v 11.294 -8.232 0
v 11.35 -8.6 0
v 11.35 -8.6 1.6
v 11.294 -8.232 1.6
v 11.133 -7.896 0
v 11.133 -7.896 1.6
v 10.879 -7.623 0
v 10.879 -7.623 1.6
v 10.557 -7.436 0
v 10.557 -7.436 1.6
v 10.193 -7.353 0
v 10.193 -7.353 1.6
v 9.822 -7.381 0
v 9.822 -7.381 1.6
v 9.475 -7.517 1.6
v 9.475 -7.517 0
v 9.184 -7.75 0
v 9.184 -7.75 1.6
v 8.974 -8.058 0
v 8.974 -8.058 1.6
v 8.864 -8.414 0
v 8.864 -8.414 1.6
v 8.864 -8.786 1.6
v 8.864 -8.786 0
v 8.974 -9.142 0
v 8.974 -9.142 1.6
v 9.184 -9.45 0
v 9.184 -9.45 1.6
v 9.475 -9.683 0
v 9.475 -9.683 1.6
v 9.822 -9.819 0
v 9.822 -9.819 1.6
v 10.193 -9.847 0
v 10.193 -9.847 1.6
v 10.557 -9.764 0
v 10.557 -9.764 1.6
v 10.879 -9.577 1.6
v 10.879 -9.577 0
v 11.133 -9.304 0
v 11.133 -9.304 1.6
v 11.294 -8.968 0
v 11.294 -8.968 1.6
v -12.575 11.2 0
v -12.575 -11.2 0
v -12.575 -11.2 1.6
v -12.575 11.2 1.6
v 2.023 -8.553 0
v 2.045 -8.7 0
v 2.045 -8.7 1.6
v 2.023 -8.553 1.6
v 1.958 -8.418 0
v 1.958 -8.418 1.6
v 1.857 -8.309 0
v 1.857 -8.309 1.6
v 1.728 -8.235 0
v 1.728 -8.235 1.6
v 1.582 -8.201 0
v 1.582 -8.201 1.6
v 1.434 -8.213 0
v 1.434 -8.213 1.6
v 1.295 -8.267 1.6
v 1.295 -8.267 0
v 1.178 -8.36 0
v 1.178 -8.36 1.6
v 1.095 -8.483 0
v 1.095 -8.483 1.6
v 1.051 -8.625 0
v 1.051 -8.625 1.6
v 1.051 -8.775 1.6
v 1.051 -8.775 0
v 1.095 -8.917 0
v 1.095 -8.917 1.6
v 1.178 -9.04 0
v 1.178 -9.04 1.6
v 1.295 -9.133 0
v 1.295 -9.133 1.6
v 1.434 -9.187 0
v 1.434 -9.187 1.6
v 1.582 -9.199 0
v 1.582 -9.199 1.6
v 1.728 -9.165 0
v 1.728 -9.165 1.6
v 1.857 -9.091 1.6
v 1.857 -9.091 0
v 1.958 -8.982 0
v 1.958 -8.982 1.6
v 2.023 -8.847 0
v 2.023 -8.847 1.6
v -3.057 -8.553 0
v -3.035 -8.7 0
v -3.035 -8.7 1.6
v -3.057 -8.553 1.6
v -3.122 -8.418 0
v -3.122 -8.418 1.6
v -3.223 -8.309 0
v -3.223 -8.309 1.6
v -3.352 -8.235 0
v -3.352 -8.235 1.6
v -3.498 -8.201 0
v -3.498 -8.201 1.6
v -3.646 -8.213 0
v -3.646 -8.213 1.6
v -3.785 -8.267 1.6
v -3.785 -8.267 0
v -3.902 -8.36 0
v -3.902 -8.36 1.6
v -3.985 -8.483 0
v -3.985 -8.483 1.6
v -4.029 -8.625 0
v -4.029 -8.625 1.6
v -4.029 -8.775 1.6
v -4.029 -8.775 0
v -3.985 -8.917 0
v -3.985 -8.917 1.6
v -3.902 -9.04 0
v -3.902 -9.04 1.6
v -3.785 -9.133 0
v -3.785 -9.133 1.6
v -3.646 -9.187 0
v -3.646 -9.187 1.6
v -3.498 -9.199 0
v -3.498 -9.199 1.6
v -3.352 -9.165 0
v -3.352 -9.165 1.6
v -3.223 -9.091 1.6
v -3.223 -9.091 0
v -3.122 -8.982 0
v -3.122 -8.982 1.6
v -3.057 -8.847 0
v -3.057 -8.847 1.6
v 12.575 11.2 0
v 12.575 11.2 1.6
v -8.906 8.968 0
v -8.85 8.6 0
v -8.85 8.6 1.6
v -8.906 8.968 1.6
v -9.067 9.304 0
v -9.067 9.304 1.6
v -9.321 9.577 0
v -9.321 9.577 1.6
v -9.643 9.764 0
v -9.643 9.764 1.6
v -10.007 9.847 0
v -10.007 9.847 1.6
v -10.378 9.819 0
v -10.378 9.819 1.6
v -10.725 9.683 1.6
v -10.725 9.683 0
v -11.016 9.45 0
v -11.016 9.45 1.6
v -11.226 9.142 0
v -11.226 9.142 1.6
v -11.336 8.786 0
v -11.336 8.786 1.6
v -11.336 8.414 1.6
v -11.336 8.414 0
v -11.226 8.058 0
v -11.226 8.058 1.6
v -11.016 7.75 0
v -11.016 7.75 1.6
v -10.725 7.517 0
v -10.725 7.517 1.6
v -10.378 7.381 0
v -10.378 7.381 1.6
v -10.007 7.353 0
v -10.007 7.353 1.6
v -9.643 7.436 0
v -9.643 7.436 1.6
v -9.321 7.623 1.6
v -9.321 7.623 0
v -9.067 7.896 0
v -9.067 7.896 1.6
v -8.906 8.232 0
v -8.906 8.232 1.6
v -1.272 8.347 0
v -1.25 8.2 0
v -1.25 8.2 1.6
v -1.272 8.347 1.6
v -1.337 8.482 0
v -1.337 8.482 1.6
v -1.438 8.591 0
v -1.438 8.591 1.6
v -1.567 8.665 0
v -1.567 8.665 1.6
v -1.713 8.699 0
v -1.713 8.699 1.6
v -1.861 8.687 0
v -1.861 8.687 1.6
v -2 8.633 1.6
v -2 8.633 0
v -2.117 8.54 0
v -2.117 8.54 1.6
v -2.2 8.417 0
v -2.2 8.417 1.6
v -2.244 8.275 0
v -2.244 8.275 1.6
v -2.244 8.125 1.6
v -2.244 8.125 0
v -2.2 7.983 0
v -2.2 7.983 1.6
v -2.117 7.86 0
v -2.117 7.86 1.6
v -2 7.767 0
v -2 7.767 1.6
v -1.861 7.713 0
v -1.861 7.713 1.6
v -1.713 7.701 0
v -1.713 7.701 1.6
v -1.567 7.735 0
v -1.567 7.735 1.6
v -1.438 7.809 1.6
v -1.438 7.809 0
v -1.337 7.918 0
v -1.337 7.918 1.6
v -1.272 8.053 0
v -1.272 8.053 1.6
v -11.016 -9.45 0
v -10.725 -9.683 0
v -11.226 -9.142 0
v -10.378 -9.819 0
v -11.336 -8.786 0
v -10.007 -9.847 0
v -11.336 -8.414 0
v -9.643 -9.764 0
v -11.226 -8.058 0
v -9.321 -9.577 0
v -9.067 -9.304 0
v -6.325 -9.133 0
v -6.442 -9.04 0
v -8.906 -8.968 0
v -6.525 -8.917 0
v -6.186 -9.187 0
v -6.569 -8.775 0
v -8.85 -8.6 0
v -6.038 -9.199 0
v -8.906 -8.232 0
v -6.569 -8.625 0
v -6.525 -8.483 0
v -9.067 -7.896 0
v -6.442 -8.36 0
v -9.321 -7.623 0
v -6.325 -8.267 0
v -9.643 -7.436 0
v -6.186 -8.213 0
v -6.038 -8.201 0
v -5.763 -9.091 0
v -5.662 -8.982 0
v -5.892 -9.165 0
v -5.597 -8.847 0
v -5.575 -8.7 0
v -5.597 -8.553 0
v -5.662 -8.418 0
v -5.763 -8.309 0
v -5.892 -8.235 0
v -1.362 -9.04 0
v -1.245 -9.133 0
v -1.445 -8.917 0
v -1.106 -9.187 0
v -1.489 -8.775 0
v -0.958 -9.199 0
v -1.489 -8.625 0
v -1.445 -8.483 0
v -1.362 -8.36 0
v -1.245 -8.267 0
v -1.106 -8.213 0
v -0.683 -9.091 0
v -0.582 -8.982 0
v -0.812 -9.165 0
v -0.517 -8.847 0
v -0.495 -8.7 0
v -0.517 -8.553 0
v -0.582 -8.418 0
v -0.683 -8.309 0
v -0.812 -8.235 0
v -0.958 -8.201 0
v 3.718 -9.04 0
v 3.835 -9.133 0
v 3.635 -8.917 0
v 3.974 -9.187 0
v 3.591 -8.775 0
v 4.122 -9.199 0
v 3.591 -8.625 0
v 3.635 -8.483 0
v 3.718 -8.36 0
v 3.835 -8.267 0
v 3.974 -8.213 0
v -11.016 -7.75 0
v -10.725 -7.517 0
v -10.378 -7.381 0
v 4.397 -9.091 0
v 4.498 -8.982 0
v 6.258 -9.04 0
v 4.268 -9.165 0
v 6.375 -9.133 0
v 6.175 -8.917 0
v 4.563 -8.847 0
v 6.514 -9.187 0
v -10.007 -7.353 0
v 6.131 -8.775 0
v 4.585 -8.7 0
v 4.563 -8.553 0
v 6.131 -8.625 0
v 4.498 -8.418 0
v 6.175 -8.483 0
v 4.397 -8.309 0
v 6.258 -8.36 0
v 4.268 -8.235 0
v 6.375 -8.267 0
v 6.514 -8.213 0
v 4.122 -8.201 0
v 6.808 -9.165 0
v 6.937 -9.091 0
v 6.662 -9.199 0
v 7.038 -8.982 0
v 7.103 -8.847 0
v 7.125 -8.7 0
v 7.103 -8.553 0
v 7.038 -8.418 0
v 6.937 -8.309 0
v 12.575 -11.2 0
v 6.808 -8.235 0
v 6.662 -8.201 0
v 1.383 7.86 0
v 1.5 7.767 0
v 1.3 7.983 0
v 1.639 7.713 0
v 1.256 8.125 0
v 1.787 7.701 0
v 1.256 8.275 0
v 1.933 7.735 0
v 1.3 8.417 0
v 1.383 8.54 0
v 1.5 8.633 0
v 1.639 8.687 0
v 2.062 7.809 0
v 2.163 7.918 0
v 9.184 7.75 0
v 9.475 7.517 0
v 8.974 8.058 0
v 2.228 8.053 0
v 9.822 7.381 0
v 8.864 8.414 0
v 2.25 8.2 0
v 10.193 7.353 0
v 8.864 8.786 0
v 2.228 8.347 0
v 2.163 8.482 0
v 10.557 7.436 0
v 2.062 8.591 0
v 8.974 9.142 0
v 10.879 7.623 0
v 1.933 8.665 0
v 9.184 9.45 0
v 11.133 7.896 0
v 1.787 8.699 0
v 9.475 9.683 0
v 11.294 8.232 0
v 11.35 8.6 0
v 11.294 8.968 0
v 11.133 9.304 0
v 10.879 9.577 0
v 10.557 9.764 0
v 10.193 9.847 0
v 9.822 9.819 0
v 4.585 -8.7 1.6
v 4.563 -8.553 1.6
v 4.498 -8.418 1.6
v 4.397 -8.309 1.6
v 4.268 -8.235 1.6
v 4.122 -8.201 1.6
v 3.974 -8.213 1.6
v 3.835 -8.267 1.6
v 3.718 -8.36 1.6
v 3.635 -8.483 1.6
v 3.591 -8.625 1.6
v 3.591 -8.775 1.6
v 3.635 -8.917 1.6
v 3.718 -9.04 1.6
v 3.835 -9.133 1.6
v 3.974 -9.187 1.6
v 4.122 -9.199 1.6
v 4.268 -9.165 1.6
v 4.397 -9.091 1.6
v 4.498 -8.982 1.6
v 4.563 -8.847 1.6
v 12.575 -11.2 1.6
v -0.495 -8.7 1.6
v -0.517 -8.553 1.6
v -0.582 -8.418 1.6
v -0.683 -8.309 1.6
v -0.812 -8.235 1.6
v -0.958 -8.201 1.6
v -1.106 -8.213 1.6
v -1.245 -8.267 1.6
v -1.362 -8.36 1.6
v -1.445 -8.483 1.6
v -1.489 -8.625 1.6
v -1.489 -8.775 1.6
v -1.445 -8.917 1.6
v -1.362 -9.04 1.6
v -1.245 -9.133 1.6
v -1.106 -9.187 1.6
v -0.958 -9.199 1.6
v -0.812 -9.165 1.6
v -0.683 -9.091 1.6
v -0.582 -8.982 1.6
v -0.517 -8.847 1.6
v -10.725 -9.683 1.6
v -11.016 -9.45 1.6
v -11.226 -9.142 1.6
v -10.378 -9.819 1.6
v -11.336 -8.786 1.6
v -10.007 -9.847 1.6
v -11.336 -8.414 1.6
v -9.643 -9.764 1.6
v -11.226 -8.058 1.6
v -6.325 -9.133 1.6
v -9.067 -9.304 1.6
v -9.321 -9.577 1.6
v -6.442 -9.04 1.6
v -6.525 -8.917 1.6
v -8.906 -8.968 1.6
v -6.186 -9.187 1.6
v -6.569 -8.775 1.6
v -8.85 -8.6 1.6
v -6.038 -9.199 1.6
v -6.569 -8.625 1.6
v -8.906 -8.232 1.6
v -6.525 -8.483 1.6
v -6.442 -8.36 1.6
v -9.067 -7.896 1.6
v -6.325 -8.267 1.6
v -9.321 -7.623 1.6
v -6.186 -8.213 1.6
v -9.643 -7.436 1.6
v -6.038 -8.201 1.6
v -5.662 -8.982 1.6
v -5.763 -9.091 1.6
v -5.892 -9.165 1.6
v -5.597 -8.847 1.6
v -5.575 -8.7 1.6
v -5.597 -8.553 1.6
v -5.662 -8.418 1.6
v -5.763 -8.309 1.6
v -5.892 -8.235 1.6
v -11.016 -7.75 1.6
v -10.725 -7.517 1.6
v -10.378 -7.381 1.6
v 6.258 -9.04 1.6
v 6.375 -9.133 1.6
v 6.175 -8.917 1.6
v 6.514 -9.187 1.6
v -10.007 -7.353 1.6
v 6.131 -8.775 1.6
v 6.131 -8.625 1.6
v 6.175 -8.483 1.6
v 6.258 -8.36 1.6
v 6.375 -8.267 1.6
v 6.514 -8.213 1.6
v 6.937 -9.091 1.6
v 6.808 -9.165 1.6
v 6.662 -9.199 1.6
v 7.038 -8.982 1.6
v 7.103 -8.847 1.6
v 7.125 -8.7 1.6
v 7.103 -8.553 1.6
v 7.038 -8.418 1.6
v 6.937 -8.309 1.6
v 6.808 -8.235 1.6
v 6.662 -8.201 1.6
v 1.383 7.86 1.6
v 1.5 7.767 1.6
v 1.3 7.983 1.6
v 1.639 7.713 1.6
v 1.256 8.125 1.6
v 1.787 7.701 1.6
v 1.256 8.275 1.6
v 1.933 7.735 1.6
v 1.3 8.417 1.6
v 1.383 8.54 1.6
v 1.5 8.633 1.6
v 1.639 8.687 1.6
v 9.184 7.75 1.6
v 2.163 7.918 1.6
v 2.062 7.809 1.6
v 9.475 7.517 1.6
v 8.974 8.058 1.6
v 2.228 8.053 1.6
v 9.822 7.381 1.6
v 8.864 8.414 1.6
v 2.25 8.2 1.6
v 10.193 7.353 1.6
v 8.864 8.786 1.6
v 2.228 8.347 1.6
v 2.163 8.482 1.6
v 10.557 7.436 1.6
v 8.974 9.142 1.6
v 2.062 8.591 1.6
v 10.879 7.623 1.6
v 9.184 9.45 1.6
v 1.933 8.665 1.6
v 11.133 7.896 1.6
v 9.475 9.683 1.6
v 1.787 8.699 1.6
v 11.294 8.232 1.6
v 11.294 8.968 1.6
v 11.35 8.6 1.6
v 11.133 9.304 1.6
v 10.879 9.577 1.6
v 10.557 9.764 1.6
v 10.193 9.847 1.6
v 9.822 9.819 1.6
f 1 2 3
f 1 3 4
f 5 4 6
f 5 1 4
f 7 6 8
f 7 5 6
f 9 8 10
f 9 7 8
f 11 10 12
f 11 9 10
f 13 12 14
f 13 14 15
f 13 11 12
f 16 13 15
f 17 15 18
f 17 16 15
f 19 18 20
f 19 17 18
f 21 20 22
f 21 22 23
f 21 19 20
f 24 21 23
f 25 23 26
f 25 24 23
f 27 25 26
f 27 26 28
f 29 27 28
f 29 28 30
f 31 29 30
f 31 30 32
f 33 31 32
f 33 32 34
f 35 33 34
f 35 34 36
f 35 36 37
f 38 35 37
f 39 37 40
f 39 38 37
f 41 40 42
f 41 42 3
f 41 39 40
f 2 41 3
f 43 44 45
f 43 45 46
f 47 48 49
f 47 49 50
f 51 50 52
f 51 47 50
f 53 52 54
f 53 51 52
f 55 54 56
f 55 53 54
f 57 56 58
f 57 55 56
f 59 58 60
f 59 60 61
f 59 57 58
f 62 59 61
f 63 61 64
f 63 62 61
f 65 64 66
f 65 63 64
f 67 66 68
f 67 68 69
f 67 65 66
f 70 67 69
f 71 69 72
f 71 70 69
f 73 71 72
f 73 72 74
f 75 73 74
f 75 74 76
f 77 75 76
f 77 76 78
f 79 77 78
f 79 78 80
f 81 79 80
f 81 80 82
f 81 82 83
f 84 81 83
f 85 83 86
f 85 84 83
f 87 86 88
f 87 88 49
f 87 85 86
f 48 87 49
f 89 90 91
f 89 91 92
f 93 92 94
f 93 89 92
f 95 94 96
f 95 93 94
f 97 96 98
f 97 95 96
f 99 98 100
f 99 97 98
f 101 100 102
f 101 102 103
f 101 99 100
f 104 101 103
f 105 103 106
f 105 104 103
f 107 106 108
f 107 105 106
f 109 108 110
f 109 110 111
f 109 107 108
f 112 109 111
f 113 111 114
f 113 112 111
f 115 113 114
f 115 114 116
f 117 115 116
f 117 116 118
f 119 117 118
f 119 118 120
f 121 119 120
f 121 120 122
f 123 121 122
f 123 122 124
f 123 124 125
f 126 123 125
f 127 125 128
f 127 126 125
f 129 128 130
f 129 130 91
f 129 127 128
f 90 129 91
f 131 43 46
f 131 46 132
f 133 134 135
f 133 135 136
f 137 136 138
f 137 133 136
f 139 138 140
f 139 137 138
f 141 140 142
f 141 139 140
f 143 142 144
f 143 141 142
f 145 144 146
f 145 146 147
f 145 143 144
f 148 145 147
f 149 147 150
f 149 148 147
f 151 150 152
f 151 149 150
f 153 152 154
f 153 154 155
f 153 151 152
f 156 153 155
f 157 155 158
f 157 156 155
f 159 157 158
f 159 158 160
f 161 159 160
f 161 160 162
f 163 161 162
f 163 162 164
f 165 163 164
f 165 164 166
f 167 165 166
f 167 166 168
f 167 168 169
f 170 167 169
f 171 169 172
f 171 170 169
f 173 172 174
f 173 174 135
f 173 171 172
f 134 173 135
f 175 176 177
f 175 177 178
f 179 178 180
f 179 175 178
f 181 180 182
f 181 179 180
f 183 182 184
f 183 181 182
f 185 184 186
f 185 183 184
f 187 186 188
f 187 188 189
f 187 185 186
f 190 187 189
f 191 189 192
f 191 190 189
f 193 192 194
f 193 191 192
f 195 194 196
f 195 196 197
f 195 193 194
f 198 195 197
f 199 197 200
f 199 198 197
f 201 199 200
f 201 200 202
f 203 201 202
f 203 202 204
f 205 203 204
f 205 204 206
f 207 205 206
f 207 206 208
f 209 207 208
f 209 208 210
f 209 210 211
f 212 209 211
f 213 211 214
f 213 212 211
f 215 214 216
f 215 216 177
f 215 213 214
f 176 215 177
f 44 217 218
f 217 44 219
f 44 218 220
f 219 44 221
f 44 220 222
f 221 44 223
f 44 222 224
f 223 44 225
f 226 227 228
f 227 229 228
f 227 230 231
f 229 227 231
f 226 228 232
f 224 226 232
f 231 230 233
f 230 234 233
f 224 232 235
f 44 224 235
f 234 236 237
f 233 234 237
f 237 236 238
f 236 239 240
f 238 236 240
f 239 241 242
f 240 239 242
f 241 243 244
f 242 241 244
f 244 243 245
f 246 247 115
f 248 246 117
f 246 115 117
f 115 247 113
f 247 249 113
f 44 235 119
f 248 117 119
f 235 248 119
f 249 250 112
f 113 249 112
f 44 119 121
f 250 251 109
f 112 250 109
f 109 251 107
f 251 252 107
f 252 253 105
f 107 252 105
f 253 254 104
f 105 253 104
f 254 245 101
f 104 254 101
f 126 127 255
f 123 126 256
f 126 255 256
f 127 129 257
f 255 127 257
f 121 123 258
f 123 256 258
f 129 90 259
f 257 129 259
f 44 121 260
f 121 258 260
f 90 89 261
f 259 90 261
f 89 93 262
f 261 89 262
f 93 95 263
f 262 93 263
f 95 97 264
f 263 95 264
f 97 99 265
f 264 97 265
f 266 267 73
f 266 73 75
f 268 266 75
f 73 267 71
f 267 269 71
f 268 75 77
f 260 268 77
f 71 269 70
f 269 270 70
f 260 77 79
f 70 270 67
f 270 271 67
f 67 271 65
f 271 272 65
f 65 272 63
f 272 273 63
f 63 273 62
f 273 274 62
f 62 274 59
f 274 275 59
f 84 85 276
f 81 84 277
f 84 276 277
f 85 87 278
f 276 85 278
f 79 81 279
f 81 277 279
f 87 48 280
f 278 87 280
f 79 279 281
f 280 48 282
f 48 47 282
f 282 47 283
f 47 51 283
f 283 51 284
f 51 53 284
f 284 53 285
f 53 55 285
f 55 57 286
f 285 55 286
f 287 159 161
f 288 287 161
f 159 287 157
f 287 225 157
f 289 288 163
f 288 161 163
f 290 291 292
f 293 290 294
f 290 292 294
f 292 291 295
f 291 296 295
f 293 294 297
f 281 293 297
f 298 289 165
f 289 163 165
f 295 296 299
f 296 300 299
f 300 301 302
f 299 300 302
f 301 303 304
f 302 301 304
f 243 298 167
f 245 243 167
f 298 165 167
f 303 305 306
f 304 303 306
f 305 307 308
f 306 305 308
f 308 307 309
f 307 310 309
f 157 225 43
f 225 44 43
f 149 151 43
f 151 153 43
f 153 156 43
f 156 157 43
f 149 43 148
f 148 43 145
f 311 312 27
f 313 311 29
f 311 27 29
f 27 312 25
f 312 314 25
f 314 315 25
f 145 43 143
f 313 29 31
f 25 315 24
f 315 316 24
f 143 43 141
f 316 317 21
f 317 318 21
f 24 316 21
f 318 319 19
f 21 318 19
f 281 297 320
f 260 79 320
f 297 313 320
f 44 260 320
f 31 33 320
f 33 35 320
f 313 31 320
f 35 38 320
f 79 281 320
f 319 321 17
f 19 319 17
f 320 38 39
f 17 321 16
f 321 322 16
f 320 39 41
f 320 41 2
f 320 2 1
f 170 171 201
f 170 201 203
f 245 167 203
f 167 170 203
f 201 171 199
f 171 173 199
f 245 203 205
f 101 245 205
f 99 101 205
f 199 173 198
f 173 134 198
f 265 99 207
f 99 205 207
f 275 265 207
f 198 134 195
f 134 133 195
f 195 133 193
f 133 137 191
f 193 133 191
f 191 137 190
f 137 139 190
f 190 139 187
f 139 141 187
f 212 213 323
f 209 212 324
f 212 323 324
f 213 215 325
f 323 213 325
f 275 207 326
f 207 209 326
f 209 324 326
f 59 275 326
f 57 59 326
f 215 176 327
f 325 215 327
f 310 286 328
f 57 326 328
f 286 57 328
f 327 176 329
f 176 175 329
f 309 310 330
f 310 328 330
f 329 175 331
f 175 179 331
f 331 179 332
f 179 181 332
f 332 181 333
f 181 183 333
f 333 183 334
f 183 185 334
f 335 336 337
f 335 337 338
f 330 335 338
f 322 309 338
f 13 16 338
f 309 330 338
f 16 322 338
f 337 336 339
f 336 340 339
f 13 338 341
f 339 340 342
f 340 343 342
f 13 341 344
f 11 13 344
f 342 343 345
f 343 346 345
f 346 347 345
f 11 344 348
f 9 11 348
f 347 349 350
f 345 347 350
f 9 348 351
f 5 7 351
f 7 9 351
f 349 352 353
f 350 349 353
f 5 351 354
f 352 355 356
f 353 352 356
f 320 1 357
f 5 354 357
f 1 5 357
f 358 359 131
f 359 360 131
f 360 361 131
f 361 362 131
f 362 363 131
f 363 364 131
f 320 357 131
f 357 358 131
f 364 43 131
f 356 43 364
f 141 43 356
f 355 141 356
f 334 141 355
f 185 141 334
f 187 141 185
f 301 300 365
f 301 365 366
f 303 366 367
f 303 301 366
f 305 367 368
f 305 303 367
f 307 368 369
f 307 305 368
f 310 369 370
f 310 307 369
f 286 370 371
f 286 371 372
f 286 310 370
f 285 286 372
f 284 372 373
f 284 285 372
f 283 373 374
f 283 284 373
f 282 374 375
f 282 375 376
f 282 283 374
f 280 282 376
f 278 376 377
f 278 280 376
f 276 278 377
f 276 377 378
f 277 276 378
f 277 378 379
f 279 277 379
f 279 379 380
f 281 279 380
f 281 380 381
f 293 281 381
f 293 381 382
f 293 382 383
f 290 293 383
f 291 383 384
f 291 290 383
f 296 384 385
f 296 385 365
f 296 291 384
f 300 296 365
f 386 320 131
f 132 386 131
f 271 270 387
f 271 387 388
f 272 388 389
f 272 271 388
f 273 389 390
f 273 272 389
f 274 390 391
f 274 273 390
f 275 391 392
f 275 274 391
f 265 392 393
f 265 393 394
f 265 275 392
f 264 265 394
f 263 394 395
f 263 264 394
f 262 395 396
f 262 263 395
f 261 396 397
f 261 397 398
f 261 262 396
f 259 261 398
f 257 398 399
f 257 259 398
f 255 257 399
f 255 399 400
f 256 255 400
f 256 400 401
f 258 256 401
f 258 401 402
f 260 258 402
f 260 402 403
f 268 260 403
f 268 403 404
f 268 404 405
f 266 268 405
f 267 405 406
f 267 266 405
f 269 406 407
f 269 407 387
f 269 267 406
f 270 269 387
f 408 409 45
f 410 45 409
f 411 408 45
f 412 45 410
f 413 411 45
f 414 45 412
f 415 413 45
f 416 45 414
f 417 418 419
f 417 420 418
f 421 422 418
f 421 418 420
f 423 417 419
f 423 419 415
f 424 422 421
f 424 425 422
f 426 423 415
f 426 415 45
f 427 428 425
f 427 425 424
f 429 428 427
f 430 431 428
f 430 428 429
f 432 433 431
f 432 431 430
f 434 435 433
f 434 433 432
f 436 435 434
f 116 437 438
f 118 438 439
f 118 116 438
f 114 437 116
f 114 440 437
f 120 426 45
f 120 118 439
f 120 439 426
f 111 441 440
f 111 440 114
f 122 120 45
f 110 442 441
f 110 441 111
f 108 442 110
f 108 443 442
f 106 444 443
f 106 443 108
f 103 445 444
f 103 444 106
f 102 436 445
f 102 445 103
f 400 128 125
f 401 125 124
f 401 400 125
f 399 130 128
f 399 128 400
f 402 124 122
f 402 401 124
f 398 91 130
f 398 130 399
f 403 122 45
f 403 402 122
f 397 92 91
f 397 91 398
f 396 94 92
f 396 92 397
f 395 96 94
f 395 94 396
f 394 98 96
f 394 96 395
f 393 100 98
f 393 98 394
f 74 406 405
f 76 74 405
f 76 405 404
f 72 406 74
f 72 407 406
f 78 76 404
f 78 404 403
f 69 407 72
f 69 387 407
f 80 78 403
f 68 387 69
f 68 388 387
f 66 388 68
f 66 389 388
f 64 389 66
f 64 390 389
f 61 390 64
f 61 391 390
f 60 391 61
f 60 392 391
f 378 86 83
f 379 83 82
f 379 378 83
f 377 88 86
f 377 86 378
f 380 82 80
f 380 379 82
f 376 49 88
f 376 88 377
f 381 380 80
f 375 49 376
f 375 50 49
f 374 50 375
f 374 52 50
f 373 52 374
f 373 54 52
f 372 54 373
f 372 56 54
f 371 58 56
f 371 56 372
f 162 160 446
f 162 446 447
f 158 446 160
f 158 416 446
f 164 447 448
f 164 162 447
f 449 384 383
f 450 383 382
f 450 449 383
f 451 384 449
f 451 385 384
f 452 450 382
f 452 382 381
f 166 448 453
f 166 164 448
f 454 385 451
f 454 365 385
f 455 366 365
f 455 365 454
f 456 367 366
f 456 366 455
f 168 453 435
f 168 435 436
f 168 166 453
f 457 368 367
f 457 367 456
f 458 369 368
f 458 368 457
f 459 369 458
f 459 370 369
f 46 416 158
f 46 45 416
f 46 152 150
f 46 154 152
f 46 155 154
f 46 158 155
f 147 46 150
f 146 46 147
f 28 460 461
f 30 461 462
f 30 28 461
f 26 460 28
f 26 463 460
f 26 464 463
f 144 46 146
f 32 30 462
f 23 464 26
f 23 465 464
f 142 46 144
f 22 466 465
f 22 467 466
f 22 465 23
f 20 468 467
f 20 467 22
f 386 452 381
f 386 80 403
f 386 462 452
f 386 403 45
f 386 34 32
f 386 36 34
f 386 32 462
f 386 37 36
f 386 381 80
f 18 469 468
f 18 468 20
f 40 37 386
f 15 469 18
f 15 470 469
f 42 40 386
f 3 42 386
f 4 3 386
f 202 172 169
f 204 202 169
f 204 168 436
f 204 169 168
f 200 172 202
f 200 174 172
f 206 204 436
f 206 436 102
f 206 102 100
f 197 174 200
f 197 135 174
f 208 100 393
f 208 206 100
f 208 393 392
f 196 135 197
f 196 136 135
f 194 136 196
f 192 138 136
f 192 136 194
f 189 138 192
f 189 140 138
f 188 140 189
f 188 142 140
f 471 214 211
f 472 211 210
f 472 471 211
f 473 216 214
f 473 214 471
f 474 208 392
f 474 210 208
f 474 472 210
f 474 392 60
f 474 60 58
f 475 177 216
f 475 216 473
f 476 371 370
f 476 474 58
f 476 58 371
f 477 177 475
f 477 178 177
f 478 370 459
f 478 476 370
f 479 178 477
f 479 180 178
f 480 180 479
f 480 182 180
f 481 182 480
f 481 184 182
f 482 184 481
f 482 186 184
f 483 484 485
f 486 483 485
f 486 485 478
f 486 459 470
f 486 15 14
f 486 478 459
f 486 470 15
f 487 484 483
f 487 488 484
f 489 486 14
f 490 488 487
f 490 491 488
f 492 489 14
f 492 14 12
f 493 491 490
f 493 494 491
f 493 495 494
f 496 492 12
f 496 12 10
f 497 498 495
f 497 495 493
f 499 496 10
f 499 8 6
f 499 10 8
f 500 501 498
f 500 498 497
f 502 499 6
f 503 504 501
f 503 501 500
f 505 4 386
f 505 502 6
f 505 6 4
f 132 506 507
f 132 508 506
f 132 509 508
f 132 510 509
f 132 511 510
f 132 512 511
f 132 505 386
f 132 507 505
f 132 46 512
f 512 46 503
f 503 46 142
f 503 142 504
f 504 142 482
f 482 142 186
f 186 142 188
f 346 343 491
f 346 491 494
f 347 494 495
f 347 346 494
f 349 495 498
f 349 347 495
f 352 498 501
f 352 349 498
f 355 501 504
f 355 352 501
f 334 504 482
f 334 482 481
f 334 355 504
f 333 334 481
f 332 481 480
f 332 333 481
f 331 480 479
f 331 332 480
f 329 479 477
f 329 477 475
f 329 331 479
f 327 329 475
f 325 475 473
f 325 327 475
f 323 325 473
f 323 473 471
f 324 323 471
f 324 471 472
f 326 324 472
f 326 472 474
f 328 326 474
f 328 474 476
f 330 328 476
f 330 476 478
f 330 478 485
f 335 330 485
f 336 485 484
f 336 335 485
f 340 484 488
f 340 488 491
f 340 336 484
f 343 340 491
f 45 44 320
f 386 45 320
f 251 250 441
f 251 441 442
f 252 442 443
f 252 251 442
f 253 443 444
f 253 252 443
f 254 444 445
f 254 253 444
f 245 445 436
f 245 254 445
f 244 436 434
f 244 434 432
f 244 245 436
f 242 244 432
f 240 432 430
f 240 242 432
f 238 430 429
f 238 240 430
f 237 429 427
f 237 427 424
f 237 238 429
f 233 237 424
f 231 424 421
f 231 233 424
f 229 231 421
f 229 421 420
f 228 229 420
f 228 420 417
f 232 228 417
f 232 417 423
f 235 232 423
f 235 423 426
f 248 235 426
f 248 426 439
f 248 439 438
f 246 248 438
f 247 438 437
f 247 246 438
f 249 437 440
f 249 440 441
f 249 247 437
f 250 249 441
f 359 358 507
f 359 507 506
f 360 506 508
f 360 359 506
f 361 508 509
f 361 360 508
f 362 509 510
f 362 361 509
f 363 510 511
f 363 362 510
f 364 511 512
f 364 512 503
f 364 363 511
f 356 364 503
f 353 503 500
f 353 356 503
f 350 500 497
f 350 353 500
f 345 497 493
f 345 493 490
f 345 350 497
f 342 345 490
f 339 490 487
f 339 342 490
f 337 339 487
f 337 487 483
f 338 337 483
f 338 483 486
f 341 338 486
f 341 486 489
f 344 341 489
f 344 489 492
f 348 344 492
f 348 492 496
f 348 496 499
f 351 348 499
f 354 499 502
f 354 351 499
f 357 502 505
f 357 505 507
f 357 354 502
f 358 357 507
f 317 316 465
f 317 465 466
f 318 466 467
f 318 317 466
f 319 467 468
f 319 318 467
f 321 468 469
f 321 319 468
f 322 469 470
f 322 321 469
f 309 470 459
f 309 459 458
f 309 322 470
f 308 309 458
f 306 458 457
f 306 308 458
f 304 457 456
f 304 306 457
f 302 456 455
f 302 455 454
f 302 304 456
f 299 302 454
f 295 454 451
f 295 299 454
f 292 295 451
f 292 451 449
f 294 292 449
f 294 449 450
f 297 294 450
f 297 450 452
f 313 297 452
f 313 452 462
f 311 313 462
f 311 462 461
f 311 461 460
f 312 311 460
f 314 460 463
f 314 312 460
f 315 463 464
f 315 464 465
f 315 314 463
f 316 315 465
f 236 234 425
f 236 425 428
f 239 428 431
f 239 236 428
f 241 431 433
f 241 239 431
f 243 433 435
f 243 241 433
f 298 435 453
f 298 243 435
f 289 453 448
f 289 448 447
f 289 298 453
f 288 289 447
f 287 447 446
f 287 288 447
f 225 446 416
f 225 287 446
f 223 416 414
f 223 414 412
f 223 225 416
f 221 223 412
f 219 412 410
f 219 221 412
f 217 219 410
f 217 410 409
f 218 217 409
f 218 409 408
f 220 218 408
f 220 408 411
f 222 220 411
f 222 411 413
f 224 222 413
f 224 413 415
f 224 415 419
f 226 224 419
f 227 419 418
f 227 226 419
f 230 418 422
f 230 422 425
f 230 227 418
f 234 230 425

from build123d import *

# Parameters (mm, degrees)
SKETCH1_W           = 25.15
SKETCH1_H           = 22.4
SKETCH1_R           = 1.25
SKETCH1_R_2         = 0.5
BOSS_EXTRUDE1_DEPTH = 1.6


with BuildPart() as part:
    # Sketch1 → Boss-Extrude1 (new body)
    with BuildSketch(Plane.XY):
        Rectangle(SKETCH1_W, SKETCH1_H)
        with Locations((-10.1, 8.6)):
            Circle(SKETCH1_R, mode=Mode.SUBTRACT)
        with Locations((10.1, 8.6)):
            Circle(SKETCH1_R, mode=Mode.SUBTRACT)
        with Locations((-10.1, -8.6)):
            Circle(SKETCH1_R, mode=Mode.SUBTRACT)
        with Locations((10.1, -8.6)):
            Circle(SKETCH1_R, mode=Mode.SUBTRACT)
        with Locations((-1.75, 8.2)):
            Circle(SKETCH1_R_2, mode=Mode.SUBTRACT)
        with Locations((1.75, 8.2)):
            Circle(SKETCH1_R_2, mode=Mode.SUBTRACT)
        with Locations((-6.075, -8.7)):
            Circle(SKETCH1_R_2, mode=Mode.SUBTRACT)
        with Locations((-3.535, -8.7)):
            Circle(SKETCH1_R_2, mode=Mode.SUBTRACT)
        with Locations((-0.995, -8.7)):
            Circle(SKETCH1_R_2, mode=Mode.SUBTRACT)
        with Locations((1.545, -8.7)):
            Circle(SKETCH1_R_2, mode=Mode.SUBTRACT)
        with Locations((4.085, -8.7)):
            Circle(SKETCH1_R_2, mode=Mode.SUBTRACT)
        with Locations((6.625, -8.7)):
            Circle(SKETCH1_R_2, mode=Mode.SUBTRACT)
    extrude(amount=BOSS_EXTRUDE1_DEPTH)


solid = part.part
